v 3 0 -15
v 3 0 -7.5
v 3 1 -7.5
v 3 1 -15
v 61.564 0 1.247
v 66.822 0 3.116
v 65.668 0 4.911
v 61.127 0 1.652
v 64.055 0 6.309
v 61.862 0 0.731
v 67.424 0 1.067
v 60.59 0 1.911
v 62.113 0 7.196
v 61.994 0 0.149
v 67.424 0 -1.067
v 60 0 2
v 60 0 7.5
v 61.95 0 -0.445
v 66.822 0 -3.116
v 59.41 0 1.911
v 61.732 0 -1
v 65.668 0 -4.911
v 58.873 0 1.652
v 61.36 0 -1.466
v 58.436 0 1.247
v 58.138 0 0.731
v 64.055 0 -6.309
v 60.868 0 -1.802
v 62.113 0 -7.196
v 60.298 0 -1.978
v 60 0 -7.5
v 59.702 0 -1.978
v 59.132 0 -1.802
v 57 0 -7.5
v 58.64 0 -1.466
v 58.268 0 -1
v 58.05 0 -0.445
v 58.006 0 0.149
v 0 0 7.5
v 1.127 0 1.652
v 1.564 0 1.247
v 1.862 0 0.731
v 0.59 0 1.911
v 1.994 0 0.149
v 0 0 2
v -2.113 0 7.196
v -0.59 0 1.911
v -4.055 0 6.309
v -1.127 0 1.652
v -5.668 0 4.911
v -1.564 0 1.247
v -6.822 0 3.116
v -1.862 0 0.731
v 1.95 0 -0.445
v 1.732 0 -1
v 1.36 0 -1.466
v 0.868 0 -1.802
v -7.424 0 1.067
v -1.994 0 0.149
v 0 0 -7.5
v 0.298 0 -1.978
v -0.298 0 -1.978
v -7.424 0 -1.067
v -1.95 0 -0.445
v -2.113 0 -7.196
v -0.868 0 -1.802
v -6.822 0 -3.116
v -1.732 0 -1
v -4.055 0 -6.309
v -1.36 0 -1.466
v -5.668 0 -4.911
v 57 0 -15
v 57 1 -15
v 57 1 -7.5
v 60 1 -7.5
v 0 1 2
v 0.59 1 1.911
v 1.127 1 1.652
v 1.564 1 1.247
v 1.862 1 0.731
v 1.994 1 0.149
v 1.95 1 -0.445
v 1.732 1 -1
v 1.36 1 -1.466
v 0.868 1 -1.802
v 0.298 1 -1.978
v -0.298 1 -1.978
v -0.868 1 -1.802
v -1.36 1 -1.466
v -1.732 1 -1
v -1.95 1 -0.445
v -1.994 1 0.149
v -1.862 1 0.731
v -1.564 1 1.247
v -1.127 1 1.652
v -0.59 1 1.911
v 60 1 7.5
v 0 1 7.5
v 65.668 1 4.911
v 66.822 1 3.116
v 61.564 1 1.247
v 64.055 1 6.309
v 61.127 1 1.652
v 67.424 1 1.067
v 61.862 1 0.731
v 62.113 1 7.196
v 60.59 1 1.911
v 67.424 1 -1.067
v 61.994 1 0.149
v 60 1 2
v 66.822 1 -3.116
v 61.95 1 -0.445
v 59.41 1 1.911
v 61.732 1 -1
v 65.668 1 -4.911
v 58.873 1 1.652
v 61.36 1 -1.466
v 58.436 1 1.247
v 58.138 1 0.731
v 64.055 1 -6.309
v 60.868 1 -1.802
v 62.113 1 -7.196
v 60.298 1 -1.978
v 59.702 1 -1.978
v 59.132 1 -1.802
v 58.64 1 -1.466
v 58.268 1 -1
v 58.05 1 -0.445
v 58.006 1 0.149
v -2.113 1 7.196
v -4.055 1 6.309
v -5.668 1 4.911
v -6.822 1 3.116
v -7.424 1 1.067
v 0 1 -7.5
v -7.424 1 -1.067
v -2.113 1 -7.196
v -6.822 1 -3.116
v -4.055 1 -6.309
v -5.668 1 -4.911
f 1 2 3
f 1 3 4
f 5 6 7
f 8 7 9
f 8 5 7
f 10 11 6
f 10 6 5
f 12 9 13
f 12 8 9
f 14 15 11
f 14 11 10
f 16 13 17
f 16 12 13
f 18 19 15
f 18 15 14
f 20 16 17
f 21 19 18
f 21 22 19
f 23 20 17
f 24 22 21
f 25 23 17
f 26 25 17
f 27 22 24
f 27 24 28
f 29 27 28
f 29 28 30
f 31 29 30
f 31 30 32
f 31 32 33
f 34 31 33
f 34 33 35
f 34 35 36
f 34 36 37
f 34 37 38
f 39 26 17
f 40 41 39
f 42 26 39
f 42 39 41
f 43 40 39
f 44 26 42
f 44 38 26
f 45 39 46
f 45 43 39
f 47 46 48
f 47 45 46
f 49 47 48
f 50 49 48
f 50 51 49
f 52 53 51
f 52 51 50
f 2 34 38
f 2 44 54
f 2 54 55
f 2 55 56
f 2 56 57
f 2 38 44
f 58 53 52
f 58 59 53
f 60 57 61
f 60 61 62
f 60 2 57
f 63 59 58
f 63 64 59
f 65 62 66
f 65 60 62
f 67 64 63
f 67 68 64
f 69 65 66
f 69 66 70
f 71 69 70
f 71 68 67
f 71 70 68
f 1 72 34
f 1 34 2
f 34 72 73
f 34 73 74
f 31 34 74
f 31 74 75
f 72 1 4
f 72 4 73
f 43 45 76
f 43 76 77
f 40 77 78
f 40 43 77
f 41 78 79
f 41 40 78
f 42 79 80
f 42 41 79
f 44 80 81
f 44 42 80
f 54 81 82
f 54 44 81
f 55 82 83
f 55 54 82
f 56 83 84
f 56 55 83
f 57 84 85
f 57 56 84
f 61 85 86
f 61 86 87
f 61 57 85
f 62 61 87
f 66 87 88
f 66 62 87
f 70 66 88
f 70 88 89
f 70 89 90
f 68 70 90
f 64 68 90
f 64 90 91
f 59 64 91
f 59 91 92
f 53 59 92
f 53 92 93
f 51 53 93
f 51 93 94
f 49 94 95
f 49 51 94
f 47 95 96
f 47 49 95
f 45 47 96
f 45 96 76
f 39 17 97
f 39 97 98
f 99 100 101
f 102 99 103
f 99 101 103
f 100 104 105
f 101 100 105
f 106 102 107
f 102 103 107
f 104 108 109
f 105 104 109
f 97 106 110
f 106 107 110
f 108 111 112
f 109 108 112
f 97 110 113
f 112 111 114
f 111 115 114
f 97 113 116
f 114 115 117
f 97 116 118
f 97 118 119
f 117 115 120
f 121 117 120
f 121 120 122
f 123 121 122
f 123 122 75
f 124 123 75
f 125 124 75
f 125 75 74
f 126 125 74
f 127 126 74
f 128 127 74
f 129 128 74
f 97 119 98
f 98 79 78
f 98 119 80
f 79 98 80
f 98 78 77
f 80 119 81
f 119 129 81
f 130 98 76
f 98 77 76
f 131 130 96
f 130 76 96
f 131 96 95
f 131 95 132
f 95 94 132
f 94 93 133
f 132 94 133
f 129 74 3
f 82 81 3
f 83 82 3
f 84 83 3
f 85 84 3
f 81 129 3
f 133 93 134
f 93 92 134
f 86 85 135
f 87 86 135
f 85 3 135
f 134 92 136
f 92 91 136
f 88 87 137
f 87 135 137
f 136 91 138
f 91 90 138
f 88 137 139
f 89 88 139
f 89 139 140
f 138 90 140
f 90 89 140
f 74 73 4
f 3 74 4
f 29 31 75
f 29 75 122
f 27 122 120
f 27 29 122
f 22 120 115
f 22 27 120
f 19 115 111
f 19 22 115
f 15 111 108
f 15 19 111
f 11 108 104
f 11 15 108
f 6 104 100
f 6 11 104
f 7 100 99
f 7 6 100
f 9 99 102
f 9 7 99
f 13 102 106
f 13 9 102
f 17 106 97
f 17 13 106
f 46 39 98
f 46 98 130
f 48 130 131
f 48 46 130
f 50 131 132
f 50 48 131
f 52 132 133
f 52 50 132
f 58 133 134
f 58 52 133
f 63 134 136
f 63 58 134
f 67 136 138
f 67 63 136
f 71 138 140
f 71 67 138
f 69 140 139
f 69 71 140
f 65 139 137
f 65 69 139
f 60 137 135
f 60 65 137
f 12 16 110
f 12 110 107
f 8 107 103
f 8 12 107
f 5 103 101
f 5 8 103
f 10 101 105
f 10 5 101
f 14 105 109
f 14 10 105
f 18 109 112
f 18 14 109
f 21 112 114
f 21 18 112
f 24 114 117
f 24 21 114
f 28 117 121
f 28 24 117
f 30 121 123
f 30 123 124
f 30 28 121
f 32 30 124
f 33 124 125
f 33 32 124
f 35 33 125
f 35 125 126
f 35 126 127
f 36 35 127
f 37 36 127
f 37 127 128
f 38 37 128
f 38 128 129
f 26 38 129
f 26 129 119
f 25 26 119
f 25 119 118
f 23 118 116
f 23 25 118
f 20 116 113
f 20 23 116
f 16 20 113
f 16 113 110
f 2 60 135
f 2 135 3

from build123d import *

# Parameters (mm, degrees)
SKETCH1_R           = 2
BOSS_EXTRUDE1_DEPTH = 1


with BuildPart() as part:
    # Sketch1 → Boss-Extrude1 (new body)
    with BuildSketch(Plane(origin=(0, 0, 0), x_dir=(1, 0, 0), z_dir=(0, 1, 0))):
        with BuildLine():
            ThreePointArc((60, 7.5), (67.5, 0), (60, -7.5))
            Line((60, -7.5), (0, -7.5))
            ThreePointArc((0, -7.5), (-7.5, 0), (0, 7.5))
            Line((0, 7.5), (3, 7.5))
            Line((3, 7.5), (3, 15))
            Line((3, 15), (57, 15))
            Line((57, 15), (57, 7.5))
            Line((57, 7.5), (60, 7.5))
        make_face()
        with Locations(Location((60, 0, 0), (0, 0, 270))):
            Circle(SKETCH1_R, mode=Mode.SUBTRACT)
        with Locations(Location((0, 0, 0), (0, 0, 270))):
            Circle(SKETCH1_R, mode=Mode.SUBTRACT)
    extrude(amount=BOSS_EXTRUDE1_DEPTH)


solid = part.part
